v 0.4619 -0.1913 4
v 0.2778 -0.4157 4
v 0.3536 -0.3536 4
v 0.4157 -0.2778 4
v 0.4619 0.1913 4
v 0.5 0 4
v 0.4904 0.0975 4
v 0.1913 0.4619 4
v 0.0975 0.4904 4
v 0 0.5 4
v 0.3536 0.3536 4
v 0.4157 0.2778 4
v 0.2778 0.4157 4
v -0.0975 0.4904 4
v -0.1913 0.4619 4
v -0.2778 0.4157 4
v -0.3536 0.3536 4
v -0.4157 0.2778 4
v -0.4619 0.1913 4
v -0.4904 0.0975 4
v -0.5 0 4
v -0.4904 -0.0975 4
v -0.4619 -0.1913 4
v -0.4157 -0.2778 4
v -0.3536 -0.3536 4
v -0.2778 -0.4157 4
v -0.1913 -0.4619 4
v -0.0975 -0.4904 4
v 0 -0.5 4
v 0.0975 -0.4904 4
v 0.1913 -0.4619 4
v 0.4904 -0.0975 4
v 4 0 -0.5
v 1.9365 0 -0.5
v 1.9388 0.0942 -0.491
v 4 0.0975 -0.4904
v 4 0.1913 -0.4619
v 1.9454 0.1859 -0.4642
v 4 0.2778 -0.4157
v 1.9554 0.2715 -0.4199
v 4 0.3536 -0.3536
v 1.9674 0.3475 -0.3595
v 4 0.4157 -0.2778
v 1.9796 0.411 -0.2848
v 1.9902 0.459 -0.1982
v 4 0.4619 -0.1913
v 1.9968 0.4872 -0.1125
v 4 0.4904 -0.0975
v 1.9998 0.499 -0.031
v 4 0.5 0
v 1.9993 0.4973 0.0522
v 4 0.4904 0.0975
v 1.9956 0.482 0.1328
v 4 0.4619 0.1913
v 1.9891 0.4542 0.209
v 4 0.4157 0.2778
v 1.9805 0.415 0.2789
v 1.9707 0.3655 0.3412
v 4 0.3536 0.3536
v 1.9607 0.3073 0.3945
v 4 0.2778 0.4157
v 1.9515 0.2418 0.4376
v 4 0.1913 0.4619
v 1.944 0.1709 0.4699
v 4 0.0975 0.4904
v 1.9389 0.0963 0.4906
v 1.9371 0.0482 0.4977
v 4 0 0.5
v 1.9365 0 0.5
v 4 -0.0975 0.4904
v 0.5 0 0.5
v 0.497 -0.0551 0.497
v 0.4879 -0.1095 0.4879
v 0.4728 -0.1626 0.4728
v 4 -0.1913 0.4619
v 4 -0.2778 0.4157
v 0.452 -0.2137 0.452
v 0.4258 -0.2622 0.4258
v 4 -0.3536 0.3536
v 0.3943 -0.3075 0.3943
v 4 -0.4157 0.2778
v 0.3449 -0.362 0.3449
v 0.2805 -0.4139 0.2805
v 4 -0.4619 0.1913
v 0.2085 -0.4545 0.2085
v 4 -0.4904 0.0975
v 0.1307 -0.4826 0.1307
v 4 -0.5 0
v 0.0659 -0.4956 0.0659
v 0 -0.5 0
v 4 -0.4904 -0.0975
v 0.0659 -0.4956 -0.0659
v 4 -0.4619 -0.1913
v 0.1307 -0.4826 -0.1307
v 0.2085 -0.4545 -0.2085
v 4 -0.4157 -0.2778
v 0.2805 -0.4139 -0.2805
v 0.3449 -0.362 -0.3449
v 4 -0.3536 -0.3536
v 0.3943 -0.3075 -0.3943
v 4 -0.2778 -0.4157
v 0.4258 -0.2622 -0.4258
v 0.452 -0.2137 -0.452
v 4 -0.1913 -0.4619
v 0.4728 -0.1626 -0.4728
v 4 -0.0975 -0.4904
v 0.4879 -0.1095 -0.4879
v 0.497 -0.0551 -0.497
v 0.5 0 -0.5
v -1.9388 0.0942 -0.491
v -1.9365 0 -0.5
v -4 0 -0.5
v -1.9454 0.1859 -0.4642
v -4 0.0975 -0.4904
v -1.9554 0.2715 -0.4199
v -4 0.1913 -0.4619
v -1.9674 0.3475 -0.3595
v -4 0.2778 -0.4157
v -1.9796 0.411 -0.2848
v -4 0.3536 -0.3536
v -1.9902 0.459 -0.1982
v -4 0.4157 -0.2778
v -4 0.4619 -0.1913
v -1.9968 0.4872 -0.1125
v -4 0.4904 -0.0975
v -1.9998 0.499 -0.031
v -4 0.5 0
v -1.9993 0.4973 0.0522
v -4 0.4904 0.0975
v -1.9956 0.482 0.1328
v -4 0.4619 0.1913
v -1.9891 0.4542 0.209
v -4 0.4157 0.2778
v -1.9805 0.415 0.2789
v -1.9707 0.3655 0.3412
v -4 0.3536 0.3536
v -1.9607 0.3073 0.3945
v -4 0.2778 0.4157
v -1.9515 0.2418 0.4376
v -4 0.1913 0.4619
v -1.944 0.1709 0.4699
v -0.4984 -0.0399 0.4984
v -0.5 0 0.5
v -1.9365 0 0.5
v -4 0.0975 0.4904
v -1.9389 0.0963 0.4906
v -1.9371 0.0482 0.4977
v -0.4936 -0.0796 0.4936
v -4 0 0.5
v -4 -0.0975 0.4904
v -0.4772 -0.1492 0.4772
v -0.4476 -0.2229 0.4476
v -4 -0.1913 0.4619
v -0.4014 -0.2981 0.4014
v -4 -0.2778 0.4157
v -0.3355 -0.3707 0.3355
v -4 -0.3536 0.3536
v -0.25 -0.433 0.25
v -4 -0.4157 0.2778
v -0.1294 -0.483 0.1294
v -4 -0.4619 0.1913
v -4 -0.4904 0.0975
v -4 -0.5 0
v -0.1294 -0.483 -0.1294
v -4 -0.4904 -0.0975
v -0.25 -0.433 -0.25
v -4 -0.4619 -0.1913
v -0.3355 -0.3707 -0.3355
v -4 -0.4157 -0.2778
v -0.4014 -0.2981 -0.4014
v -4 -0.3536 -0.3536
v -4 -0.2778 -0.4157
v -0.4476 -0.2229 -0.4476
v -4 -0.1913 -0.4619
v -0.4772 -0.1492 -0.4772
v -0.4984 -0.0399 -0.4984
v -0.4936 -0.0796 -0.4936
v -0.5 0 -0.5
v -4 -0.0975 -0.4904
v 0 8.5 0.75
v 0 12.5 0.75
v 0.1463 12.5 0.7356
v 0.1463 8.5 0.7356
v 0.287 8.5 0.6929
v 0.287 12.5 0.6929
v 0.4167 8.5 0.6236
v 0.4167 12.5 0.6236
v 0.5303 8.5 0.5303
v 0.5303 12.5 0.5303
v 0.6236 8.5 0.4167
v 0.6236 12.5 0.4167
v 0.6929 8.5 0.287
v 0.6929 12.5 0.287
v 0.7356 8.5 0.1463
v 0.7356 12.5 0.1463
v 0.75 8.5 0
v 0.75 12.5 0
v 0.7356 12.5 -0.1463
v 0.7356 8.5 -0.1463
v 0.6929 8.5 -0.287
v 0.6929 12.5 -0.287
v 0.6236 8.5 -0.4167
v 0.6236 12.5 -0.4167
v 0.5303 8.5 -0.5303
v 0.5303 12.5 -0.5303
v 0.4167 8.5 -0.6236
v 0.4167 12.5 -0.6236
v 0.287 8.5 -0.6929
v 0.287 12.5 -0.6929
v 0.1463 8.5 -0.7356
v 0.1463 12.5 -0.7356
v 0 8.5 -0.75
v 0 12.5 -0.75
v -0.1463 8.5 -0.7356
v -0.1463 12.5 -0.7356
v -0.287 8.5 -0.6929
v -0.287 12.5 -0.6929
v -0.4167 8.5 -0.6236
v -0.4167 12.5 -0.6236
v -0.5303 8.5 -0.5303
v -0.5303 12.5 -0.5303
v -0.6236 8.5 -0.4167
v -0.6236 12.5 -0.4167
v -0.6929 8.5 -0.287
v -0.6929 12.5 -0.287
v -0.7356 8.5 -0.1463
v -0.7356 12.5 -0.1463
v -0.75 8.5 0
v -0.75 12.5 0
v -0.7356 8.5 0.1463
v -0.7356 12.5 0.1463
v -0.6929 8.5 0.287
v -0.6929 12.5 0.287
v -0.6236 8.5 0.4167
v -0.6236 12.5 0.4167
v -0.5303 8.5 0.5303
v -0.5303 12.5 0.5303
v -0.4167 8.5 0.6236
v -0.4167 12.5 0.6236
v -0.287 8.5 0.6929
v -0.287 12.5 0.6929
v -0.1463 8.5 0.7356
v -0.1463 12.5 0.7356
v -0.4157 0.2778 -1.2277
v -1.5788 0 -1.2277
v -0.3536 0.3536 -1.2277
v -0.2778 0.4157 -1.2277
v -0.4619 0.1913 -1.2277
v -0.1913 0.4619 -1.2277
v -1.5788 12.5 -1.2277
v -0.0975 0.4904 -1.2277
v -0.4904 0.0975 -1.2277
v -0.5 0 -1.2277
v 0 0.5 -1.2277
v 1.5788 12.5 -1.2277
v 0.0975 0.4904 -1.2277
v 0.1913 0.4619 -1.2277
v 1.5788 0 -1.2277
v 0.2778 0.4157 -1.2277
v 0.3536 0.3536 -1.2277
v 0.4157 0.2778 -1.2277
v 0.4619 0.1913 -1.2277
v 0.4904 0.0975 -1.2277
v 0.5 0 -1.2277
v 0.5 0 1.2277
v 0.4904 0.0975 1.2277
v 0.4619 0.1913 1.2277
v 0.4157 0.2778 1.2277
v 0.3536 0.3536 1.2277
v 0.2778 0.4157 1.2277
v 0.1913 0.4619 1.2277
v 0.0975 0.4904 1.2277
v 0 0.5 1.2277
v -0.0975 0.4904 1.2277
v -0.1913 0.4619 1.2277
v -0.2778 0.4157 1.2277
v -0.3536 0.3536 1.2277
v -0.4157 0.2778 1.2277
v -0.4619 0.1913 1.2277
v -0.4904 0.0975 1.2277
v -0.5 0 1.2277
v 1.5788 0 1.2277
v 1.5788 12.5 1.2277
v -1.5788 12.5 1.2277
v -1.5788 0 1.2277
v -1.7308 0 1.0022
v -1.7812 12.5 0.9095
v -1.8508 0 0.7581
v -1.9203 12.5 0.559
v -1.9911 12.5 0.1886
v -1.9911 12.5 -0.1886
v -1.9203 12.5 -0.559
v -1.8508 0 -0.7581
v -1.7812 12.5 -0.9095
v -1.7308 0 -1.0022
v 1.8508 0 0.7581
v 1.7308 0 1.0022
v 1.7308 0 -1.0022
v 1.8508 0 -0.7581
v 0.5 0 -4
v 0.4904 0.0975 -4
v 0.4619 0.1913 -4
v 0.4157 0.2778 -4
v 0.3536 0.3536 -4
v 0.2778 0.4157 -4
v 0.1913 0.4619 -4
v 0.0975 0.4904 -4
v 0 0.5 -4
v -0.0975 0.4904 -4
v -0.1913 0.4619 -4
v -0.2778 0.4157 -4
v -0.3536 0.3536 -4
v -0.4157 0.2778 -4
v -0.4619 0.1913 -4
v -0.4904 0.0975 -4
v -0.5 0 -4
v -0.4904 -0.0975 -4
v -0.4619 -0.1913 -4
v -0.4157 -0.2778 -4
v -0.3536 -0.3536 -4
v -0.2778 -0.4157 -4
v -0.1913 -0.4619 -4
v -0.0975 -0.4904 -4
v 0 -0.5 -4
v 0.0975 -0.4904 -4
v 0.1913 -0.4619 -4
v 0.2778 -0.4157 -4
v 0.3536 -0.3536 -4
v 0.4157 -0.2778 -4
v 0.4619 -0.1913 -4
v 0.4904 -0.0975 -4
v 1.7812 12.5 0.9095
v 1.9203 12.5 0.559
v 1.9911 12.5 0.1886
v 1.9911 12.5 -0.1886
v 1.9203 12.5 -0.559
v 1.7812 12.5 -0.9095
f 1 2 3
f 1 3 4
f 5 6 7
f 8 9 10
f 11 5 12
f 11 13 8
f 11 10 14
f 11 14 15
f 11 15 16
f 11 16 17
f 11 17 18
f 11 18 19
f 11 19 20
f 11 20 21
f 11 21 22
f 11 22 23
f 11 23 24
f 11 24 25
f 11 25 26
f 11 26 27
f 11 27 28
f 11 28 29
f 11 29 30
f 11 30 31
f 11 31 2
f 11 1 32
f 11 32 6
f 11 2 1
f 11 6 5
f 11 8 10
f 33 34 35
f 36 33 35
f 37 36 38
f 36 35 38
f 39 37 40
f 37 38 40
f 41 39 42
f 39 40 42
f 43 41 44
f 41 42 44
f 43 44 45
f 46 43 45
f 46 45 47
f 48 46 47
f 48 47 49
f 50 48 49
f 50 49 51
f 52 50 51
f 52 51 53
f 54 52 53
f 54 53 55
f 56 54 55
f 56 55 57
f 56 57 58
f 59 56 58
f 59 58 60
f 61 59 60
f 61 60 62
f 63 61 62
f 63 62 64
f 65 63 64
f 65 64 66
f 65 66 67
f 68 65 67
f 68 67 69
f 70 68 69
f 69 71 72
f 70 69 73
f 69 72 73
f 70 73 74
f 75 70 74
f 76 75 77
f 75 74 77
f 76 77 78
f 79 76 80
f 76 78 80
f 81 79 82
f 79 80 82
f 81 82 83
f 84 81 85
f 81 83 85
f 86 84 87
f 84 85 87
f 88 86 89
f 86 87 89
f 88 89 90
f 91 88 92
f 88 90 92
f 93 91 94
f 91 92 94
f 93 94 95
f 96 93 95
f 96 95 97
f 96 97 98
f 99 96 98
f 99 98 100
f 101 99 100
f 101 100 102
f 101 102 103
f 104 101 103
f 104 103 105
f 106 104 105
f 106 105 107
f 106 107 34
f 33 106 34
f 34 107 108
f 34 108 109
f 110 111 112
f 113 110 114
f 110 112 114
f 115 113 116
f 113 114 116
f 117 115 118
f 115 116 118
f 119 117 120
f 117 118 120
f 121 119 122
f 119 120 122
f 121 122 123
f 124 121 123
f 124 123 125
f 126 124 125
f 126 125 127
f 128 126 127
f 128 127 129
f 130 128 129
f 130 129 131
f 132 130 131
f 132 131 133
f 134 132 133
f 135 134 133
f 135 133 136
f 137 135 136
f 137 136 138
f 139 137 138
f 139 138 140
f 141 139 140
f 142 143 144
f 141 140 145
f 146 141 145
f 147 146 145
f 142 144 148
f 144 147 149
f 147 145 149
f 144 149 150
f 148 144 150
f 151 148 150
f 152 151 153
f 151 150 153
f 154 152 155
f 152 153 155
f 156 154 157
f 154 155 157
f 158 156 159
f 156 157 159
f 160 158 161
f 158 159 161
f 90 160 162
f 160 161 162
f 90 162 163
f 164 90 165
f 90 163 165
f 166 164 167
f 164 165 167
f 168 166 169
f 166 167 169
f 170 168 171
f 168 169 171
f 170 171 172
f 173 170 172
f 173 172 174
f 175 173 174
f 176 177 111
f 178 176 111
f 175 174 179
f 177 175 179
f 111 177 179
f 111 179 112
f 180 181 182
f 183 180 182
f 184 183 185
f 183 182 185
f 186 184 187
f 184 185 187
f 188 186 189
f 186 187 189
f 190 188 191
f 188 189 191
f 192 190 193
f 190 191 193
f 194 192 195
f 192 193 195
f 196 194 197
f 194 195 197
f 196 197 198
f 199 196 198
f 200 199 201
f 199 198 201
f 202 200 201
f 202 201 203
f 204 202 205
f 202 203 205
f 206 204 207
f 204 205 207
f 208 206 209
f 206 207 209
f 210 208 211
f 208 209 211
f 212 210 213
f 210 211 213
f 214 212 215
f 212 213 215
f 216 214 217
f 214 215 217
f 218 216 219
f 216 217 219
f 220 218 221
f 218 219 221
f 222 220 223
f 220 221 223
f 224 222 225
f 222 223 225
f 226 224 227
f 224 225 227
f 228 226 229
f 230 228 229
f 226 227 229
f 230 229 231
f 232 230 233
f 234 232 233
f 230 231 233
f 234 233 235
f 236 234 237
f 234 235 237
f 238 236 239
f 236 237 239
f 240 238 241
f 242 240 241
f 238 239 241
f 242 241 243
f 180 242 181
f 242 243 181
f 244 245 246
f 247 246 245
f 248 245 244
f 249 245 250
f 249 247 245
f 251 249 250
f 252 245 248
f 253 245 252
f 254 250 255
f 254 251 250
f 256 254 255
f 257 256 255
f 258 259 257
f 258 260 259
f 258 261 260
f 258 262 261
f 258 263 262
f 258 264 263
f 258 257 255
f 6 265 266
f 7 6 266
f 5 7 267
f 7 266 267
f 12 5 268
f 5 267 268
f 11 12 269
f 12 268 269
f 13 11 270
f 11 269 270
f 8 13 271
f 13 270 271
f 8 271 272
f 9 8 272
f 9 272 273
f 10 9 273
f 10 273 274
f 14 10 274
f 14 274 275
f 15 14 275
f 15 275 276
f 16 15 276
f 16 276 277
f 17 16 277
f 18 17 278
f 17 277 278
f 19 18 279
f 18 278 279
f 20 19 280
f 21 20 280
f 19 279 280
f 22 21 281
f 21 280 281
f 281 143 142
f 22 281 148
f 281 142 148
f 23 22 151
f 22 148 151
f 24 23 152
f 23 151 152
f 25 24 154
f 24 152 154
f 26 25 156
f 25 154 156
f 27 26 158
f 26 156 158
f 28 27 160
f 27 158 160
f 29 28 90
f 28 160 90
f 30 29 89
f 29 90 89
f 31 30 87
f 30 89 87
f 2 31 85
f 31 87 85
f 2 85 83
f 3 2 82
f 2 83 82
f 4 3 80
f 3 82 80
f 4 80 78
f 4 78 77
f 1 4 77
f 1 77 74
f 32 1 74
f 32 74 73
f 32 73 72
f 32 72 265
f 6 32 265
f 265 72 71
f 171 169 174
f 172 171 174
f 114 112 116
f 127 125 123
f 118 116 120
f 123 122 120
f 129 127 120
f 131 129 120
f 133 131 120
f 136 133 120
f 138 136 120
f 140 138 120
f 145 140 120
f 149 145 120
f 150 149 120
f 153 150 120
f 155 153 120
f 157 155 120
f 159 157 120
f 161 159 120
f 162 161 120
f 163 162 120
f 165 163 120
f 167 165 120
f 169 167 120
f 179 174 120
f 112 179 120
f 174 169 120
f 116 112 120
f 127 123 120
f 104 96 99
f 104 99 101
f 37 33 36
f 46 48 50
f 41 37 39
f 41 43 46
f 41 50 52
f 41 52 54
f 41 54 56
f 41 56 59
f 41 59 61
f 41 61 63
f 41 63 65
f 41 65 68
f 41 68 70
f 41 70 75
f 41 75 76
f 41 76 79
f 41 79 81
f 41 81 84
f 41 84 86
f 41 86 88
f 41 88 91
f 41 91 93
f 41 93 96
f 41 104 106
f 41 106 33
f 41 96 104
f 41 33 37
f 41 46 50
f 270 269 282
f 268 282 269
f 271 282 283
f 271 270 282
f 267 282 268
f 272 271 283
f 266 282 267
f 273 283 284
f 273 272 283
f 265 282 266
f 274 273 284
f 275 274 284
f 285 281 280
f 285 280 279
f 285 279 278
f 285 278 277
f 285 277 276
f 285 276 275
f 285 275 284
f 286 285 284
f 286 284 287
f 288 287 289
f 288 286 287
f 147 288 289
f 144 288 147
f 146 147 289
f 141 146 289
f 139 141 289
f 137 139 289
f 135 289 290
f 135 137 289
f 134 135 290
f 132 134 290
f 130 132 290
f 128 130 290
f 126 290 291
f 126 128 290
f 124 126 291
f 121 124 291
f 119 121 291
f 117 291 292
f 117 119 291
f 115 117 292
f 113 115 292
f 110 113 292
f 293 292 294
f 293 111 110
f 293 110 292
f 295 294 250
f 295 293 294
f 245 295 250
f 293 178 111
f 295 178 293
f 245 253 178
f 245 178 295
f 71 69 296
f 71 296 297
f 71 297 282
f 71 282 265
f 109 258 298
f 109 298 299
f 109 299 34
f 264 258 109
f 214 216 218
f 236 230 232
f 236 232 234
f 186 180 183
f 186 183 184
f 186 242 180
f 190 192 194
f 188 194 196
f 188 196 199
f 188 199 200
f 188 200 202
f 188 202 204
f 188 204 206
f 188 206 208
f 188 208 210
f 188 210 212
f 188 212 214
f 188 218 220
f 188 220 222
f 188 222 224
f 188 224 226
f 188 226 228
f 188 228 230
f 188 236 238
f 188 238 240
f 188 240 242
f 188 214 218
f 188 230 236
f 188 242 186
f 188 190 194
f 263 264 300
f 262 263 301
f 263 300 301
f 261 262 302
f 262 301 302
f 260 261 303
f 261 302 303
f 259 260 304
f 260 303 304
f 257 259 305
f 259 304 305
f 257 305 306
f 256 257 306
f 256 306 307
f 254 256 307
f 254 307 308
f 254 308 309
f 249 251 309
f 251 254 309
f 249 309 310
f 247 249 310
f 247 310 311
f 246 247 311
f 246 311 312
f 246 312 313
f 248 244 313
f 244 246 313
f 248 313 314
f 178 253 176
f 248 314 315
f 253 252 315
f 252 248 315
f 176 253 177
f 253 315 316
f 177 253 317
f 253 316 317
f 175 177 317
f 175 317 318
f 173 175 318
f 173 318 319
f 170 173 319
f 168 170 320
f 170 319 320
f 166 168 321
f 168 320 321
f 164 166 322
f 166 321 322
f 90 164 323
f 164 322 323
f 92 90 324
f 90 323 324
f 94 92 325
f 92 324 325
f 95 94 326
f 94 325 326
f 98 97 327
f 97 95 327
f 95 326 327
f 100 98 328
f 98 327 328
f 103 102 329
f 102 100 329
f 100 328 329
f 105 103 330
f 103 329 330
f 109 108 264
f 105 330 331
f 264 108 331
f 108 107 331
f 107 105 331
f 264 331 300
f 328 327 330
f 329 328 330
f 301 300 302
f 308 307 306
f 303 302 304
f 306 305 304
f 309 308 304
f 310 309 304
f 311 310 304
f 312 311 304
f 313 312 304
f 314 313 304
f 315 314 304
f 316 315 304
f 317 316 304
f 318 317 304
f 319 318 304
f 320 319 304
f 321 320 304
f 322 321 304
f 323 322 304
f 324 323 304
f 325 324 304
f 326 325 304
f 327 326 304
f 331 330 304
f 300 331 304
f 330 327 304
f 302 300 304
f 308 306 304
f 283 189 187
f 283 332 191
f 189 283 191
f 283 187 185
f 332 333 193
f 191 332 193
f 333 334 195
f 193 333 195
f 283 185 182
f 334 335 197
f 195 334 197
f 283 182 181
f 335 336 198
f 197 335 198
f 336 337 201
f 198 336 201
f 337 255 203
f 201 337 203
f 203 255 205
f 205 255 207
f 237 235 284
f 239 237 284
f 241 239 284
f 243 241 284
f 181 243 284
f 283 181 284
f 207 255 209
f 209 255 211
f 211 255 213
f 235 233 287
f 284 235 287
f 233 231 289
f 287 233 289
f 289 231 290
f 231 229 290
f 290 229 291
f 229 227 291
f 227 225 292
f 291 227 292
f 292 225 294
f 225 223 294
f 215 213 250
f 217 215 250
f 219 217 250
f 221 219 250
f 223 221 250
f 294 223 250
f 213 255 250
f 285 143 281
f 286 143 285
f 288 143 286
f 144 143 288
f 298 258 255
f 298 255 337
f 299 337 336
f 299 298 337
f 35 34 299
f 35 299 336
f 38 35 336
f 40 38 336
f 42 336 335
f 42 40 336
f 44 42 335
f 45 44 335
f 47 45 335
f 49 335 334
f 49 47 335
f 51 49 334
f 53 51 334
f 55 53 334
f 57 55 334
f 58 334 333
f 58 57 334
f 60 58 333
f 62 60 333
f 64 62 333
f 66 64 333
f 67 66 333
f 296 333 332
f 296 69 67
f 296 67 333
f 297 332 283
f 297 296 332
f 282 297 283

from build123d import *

# Parameters (mm, degrees)
BOSS_EXTRUDE1_DEPTH      = 12.5
SKETCH2_R                = 0.75
CUT_EXTRUDE1_DEPTH       = 4
BOSS_EXTRUDE2_DEPTH      = 4
BOSS_EXTRUDE2_DEPTH_BACK = 4
SKETCH3_R                = 0.5
BOSS_EXTRUDE3_DEPTH      = 4
BOSS_EXTRUDE3_DEPTH_BACK = 4
SKETCH4_R                = 0.5


with BuildPart() as part:
    # Sketch1 → Boss-Extrude1 (new body)
    with BuildSketch(Plane(origin=(0, 0, 0), x_dir=(1, 0, 0), z_dir=(0, 1, 0))):
        with BuildLine():
            Line((-1.578824879, 1.227726355), (1.578824879, 1.227726355))
            ThreePointArc((1.578824879, 1.227726355), (2, 0), (1.578824879, -1.227726355))
            Line((1.578824879, -1.227726355), (-1.578824879, -1.227726355))
            ThreePointArc((-1.578824879, -1.227726355), (-2, 0), (-1.578824879, 1.227726355))
        make_face()
    extrude(amount=BOSS_EXTRUDE1_DEPTH)

    # Sketch2 → Cut-Extrude1 (cut)
    with BuildSketch(Plane(origin=(0, 12.5, 0), x_dir=(1, 0, 0), z_dir=(0, 1, 0))):
        Circle(SKETCH2_R)
    extrude(amount=-CUT_EXTRUDE1_DEPTH, mode=Mode.SUBTRACT)

    # Sketch3 → Boss-Extrude2 (add, two sides: drawn at the far end of the back side and taken through both)
    with BuildSketch(Plane.XY.offset(-BOSS_EXTRUDE2_DEPTH_BACK)):
        Circle(SKETCH3_R)
    extrude(amount=BOSS_EXTRUDE2_DEPTH + BOSS_EXTRUDE2_DEPTH_BACK)

    # Sketch4 → Boss-Extrude3 (add, two sides: drawn at the far end of the back side and taken through both)
    with BuildSketch(Plane(origin=(0, 0, 0), x_dir=(0, 0, -1), z_dir=(1, 0, 0)).offset(-BOSS_EXTRUDE3_DEPTH_BACK)):
        Circle(SKETCH4_R)
    extrude(amount=BOSS_EXTRUDE3_DEPTH + BOSS_EXTRUDE3_DEPTH_BACK)


solid = part.part
